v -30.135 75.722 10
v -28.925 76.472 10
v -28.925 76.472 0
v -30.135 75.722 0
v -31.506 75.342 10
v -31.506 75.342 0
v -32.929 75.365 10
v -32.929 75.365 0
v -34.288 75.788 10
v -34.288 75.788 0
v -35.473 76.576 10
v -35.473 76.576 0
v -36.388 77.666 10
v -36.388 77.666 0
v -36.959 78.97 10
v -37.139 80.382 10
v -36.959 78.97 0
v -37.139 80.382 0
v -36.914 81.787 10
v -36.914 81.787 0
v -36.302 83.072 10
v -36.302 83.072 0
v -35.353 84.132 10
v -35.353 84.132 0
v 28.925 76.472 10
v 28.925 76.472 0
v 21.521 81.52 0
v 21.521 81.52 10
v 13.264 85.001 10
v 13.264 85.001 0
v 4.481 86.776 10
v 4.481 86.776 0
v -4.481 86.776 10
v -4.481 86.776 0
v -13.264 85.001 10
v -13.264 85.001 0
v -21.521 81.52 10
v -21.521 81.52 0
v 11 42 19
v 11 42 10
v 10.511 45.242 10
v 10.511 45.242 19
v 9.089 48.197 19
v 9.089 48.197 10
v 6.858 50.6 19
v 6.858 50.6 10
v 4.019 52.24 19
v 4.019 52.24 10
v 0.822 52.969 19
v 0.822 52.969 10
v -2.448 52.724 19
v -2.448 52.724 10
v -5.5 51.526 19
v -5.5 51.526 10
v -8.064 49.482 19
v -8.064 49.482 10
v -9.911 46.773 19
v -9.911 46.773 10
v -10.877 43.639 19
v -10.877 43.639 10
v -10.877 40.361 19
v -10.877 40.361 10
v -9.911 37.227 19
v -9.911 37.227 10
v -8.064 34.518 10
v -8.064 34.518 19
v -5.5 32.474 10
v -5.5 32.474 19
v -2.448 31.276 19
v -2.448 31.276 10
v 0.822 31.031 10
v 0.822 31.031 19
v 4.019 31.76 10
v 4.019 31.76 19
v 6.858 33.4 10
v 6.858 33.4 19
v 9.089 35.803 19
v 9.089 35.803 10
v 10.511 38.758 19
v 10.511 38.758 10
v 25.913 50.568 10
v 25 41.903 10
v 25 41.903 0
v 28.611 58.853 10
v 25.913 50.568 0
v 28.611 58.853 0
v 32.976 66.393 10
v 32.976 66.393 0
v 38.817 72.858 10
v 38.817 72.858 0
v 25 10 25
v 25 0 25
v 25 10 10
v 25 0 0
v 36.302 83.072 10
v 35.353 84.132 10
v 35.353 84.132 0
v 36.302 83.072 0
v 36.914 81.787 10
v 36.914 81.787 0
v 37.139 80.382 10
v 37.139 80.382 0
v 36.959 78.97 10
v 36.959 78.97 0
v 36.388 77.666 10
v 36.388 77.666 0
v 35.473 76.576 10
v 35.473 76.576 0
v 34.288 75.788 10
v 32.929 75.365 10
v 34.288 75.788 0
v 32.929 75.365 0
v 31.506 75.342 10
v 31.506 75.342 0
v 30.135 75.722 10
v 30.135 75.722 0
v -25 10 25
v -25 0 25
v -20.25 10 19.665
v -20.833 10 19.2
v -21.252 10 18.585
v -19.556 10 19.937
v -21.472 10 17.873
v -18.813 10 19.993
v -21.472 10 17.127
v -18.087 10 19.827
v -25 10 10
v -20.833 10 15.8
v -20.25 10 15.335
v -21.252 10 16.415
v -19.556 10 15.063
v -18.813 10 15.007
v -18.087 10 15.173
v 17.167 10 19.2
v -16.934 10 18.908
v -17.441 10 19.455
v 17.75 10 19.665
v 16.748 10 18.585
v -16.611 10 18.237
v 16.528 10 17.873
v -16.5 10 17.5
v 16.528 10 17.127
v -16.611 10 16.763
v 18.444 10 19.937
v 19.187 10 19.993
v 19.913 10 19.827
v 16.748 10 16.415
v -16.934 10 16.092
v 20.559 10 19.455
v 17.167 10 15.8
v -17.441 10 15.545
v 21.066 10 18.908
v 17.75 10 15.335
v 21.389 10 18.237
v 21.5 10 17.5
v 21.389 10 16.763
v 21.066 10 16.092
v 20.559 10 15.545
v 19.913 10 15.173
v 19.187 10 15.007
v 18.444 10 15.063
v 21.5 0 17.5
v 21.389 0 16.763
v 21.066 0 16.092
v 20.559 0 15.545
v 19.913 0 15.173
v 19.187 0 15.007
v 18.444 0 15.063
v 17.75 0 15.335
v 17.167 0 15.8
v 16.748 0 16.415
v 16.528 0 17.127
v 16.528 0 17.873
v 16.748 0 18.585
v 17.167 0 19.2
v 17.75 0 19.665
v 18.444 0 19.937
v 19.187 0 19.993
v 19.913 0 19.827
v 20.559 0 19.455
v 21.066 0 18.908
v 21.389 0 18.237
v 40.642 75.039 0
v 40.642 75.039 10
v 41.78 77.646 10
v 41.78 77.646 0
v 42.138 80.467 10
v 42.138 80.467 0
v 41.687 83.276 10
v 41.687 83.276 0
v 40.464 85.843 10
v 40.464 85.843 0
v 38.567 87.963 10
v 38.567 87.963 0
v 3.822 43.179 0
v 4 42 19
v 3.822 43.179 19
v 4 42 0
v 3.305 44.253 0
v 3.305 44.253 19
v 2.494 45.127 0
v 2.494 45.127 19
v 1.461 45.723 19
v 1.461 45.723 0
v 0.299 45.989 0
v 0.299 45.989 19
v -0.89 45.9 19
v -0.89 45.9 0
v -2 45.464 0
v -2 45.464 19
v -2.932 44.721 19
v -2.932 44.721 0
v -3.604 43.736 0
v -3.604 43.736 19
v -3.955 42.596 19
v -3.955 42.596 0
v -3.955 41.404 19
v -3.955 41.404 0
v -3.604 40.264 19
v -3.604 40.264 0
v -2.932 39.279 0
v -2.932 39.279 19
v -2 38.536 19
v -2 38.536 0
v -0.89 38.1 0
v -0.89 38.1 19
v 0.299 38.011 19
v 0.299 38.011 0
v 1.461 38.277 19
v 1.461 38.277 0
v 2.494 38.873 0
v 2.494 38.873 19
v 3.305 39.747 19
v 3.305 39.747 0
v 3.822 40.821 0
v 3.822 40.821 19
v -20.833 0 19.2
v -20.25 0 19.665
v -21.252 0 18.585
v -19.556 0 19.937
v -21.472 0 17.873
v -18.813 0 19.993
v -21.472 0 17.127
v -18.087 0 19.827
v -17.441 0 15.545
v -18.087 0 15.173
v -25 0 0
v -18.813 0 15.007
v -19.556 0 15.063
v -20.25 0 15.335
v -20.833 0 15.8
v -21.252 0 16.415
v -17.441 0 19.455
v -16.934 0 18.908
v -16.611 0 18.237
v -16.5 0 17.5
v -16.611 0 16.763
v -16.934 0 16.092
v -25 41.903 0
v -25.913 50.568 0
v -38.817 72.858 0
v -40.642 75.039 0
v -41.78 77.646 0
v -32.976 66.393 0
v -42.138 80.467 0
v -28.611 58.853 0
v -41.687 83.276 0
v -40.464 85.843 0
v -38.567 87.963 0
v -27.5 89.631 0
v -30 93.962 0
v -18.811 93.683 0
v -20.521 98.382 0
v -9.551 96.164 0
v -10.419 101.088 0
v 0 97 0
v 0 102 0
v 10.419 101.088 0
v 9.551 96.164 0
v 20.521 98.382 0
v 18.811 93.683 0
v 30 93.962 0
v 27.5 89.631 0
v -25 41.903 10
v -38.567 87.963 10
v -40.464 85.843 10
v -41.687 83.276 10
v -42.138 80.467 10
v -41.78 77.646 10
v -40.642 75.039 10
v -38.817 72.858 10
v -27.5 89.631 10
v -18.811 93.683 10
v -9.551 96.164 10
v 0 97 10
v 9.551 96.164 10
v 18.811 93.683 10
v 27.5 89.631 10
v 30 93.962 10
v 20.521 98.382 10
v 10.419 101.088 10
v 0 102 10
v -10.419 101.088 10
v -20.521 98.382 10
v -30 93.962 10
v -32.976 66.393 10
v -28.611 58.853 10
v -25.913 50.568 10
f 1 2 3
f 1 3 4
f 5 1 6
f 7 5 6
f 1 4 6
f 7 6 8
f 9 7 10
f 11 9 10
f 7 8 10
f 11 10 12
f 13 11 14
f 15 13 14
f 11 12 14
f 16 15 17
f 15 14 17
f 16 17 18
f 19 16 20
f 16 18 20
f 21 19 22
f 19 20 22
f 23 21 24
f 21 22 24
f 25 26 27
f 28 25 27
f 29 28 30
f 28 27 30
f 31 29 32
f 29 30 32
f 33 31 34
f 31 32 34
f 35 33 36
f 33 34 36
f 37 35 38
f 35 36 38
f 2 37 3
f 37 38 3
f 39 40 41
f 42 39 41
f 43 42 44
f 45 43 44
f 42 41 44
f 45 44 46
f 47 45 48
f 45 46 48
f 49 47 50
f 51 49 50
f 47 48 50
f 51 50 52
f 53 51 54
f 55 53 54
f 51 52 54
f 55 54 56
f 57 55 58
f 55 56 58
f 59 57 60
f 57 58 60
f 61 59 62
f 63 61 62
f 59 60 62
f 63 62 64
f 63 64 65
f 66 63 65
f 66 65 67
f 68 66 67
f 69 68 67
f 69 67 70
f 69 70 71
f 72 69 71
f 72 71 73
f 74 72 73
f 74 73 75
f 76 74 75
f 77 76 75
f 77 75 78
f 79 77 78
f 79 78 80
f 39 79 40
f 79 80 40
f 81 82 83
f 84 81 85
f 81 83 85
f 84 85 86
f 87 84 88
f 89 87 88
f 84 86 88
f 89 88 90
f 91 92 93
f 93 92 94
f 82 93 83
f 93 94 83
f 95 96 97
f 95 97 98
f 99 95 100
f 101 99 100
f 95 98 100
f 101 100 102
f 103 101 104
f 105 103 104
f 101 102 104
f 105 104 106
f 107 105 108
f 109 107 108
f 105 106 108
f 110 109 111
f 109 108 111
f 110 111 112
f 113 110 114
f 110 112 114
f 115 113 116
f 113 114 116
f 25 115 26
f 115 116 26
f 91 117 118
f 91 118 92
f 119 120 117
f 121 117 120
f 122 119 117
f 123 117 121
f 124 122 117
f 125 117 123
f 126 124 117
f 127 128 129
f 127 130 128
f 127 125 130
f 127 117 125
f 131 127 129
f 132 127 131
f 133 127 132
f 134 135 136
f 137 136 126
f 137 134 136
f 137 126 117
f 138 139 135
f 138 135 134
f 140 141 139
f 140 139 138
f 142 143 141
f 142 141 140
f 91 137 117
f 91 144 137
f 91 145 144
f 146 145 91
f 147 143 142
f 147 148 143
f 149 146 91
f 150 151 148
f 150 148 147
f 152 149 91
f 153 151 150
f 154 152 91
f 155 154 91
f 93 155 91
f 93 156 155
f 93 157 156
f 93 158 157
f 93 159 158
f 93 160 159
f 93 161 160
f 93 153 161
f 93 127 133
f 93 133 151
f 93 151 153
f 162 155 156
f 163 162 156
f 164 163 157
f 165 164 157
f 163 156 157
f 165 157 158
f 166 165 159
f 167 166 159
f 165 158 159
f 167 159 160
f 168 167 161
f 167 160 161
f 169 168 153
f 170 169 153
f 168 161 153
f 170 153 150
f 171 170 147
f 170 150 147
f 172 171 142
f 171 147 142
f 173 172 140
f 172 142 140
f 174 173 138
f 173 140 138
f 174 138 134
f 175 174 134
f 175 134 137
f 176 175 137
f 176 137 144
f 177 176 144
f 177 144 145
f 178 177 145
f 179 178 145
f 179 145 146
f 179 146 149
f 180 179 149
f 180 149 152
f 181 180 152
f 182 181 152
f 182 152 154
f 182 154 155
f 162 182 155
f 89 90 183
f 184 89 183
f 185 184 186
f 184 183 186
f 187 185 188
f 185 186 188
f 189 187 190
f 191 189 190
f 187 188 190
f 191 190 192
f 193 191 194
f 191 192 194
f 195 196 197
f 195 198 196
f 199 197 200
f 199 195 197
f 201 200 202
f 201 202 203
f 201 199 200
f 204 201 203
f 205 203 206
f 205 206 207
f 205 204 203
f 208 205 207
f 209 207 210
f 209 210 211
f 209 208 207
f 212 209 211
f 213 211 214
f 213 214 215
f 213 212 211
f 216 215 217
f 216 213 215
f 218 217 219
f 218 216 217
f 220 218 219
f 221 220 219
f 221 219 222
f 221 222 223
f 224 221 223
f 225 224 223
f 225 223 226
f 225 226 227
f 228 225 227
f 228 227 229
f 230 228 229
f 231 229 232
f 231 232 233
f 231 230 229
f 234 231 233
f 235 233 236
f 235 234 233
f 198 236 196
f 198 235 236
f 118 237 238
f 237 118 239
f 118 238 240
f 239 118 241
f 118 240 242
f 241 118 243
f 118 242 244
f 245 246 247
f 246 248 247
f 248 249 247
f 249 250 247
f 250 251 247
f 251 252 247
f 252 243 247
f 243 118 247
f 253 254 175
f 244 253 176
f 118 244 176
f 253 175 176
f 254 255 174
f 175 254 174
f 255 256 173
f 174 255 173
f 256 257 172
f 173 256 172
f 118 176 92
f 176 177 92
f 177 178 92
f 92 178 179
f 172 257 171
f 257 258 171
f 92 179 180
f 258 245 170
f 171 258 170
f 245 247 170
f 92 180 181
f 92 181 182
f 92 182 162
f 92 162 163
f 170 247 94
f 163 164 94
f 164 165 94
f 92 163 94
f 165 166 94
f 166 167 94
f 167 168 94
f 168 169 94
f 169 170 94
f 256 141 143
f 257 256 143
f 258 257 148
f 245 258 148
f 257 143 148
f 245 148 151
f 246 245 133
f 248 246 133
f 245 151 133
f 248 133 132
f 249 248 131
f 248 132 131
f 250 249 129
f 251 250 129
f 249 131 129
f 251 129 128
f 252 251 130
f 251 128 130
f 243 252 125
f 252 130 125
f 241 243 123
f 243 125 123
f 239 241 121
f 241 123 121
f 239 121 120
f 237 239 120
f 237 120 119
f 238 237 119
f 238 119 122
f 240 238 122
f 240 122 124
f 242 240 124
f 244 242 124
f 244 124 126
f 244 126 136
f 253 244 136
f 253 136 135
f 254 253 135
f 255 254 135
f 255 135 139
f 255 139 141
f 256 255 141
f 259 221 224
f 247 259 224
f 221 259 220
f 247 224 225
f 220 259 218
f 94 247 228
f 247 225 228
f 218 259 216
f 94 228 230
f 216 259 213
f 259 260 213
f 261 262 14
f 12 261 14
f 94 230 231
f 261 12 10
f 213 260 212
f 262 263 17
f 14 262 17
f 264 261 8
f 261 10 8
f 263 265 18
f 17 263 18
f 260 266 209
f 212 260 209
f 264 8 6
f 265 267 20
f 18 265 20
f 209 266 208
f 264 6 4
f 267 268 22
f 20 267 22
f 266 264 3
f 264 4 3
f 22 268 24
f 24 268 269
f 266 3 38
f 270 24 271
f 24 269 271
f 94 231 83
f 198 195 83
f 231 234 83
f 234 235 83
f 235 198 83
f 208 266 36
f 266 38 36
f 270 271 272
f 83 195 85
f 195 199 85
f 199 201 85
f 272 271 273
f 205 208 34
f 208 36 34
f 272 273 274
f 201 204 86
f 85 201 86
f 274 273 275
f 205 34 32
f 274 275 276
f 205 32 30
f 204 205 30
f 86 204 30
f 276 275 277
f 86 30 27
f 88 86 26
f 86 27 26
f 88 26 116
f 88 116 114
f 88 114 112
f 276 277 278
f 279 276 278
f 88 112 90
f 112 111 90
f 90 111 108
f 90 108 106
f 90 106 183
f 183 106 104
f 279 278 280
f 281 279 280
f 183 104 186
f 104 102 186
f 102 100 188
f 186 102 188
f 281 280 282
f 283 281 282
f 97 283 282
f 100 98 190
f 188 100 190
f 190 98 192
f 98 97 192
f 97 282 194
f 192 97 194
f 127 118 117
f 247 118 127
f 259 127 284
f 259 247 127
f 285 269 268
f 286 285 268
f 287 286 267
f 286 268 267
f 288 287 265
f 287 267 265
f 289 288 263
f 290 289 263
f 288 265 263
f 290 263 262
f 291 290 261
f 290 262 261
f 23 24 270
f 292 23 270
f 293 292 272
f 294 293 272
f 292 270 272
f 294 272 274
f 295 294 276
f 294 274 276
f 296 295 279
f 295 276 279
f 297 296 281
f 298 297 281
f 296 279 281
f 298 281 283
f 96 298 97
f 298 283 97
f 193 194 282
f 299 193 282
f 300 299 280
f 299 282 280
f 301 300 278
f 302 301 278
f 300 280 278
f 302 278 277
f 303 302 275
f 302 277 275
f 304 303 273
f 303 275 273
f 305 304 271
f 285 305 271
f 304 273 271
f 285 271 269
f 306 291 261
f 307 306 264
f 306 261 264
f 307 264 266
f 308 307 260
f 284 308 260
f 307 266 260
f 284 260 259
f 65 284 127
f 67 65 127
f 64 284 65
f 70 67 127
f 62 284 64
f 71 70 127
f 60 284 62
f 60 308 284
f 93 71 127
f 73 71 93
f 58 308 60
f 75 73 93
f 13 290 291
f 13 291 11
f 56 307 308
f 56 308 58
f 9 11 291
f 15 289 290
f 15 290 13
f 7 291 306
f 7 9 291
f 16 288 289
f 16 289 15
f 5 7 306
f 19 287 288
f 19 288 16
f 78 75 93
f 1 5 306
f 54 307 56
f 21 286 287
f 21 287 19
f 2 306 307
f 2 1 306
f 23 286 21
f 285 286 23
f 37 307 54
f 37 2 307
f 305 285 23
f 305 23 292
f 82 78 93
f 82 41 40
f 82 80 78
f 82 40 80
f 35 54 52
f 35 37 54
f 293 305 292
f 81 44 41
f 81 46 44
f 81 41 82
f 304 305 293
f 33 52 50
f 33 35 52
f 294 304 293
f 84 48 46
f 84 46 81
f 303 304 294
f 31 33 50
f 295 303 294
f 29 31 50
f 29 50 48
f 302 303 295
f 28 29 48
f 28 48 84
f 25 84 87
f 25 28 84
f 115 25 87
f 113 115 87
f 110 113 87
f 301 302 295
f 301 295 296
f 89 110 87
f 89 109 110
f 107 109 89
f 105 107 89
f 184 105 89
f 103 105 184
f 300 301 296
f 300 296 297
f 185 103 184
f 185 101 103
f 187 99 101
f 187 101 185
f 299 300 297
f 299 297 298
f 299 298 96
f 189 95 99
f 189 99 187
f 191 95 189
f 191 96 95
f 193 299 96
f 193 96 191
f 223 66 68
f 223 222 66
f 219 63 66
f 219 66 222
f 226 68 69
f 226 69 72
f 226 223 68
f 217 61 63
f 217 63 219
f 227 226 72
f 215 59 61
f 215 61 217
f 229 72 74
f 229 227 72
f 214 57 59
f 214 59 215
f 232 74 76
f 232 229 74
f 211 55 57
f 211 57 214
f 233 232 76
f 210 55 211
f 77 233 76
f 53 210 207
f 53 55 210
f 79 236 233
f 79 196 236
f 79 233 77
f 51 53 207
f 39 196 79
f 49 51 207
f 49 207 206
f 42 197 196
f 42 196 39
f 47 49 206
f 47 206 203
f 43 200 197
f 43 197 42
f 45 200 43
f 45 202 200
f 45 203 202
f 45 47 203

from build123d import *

# Parameters (mm, degrees)
SKETCH1_R           = 4
BOSS_EXTRUDE1_DEPTH = 10
SKETCH2_W           = 50
SKETCH2_H           = 10
BOSS_EXTRUDE2_DEPTH = 15
SKETCH3_R           = 2.5
CUT_EXTRUDE1_DEPTH  = 11
SKETCH4_R           = 11
SKETCH4_R_2         = 4
BOSS_EXTRUDE3_DEPTH = 9


with BuildPart() as part:
    # Sketch1 → Boss-Extrude1 (new body)
    with BuildSketch(Plane.XY):
        with BuildLine():
            Line((25, 0), (25, 41.903210357))
            ThreePointArc((25, 41.903210357), (28.610974366, 58.852541508), (38.81677775, 72.858273892))
            ThreePointArc((38.81677775, 72.858273892), (42.138016249, 80.467397369), (38.567256581, 87.962666587))
            ThreePointArc((38.567256581, 87.962666587), (0, 102), (-38.567256581, 87.962666587))
            ThreePointArc((-38.567256581, 87.962666587), (-42.138016249, 80.467397369), (-38.81677775, 72.858273892))
            ThreePointArc((-38.81677775, 72.858273892), (-28.610974366, 58.852541508), (-25, 41.903210357))
            Line((-25, 41.903210357), (-25, 0))
            Line((-25, 0), (25, 0))
        make_face()
        with Locations((0, 42)):
            Circle(SKETCH1_R, mode=Mode.SUBTRACT)
        with BuildLine():
            ThreePointArc((28.925442436, 76.47199994), (0, 87), (-28.925442436, 76.47199994))
            ThreePointArc((-28.925442436, 76.47199994), (-35.9696027, 77.088284108), (-35.353318533, 84.132444372))
            ThreePointArc((-35.353318533, 84.132444372), (0, 97), (35.353318533, 84.132444372))
            ThreePointArc((35.353318533, 84.132444372), (35.9696027, 77.088284108), (28.925442436, 76.47199994))
        make_face(mode=Mode.SUBTRACT)
    extrude(amount=BOSS_EXTRUDE1_DEPTH)

    # Sketch2 → Boss-Extrude2 (add)
    with BuildSketch(Plane.XY.offset(10)):
        with Locations((0, 5)):
            Rectangle(SKETCH2_W, SKETCH2_H)
    extrude(amount=BOSS_EXTRUDE2_DEPTH)

    # Sketch3 → Cut-Extrude1 (cut, through all)
    with BuildSketch(Plane(origin=(0, 10, 0), x_dir=(1, 0, 0), z_dir=(0, 1, 0))):
        with Locations((-19, -17.5)):
            Circle(SKETCH3_R)
        with Locations((19, -17.5)):
            Circle(SKETCH3_R)
    extrude(amount=-CUT_EXTRUDE1_DEPTH, mode=Mode.SUBTRACT)

    # Sketch4 → Boss-Extrude3 (add)
    with BuildSketch(Plane.XY.offset(10)):
        with Locations((0, 42)):
            Circle(SKETCH4_R)
        with Locations((0, 42)):
            Circle(SKETCH4_R_2, mode=Mode.SUBTRACT)
    extrude(amount=BOSS_EXTRUDE3_DEPTH)


solid = part.part
